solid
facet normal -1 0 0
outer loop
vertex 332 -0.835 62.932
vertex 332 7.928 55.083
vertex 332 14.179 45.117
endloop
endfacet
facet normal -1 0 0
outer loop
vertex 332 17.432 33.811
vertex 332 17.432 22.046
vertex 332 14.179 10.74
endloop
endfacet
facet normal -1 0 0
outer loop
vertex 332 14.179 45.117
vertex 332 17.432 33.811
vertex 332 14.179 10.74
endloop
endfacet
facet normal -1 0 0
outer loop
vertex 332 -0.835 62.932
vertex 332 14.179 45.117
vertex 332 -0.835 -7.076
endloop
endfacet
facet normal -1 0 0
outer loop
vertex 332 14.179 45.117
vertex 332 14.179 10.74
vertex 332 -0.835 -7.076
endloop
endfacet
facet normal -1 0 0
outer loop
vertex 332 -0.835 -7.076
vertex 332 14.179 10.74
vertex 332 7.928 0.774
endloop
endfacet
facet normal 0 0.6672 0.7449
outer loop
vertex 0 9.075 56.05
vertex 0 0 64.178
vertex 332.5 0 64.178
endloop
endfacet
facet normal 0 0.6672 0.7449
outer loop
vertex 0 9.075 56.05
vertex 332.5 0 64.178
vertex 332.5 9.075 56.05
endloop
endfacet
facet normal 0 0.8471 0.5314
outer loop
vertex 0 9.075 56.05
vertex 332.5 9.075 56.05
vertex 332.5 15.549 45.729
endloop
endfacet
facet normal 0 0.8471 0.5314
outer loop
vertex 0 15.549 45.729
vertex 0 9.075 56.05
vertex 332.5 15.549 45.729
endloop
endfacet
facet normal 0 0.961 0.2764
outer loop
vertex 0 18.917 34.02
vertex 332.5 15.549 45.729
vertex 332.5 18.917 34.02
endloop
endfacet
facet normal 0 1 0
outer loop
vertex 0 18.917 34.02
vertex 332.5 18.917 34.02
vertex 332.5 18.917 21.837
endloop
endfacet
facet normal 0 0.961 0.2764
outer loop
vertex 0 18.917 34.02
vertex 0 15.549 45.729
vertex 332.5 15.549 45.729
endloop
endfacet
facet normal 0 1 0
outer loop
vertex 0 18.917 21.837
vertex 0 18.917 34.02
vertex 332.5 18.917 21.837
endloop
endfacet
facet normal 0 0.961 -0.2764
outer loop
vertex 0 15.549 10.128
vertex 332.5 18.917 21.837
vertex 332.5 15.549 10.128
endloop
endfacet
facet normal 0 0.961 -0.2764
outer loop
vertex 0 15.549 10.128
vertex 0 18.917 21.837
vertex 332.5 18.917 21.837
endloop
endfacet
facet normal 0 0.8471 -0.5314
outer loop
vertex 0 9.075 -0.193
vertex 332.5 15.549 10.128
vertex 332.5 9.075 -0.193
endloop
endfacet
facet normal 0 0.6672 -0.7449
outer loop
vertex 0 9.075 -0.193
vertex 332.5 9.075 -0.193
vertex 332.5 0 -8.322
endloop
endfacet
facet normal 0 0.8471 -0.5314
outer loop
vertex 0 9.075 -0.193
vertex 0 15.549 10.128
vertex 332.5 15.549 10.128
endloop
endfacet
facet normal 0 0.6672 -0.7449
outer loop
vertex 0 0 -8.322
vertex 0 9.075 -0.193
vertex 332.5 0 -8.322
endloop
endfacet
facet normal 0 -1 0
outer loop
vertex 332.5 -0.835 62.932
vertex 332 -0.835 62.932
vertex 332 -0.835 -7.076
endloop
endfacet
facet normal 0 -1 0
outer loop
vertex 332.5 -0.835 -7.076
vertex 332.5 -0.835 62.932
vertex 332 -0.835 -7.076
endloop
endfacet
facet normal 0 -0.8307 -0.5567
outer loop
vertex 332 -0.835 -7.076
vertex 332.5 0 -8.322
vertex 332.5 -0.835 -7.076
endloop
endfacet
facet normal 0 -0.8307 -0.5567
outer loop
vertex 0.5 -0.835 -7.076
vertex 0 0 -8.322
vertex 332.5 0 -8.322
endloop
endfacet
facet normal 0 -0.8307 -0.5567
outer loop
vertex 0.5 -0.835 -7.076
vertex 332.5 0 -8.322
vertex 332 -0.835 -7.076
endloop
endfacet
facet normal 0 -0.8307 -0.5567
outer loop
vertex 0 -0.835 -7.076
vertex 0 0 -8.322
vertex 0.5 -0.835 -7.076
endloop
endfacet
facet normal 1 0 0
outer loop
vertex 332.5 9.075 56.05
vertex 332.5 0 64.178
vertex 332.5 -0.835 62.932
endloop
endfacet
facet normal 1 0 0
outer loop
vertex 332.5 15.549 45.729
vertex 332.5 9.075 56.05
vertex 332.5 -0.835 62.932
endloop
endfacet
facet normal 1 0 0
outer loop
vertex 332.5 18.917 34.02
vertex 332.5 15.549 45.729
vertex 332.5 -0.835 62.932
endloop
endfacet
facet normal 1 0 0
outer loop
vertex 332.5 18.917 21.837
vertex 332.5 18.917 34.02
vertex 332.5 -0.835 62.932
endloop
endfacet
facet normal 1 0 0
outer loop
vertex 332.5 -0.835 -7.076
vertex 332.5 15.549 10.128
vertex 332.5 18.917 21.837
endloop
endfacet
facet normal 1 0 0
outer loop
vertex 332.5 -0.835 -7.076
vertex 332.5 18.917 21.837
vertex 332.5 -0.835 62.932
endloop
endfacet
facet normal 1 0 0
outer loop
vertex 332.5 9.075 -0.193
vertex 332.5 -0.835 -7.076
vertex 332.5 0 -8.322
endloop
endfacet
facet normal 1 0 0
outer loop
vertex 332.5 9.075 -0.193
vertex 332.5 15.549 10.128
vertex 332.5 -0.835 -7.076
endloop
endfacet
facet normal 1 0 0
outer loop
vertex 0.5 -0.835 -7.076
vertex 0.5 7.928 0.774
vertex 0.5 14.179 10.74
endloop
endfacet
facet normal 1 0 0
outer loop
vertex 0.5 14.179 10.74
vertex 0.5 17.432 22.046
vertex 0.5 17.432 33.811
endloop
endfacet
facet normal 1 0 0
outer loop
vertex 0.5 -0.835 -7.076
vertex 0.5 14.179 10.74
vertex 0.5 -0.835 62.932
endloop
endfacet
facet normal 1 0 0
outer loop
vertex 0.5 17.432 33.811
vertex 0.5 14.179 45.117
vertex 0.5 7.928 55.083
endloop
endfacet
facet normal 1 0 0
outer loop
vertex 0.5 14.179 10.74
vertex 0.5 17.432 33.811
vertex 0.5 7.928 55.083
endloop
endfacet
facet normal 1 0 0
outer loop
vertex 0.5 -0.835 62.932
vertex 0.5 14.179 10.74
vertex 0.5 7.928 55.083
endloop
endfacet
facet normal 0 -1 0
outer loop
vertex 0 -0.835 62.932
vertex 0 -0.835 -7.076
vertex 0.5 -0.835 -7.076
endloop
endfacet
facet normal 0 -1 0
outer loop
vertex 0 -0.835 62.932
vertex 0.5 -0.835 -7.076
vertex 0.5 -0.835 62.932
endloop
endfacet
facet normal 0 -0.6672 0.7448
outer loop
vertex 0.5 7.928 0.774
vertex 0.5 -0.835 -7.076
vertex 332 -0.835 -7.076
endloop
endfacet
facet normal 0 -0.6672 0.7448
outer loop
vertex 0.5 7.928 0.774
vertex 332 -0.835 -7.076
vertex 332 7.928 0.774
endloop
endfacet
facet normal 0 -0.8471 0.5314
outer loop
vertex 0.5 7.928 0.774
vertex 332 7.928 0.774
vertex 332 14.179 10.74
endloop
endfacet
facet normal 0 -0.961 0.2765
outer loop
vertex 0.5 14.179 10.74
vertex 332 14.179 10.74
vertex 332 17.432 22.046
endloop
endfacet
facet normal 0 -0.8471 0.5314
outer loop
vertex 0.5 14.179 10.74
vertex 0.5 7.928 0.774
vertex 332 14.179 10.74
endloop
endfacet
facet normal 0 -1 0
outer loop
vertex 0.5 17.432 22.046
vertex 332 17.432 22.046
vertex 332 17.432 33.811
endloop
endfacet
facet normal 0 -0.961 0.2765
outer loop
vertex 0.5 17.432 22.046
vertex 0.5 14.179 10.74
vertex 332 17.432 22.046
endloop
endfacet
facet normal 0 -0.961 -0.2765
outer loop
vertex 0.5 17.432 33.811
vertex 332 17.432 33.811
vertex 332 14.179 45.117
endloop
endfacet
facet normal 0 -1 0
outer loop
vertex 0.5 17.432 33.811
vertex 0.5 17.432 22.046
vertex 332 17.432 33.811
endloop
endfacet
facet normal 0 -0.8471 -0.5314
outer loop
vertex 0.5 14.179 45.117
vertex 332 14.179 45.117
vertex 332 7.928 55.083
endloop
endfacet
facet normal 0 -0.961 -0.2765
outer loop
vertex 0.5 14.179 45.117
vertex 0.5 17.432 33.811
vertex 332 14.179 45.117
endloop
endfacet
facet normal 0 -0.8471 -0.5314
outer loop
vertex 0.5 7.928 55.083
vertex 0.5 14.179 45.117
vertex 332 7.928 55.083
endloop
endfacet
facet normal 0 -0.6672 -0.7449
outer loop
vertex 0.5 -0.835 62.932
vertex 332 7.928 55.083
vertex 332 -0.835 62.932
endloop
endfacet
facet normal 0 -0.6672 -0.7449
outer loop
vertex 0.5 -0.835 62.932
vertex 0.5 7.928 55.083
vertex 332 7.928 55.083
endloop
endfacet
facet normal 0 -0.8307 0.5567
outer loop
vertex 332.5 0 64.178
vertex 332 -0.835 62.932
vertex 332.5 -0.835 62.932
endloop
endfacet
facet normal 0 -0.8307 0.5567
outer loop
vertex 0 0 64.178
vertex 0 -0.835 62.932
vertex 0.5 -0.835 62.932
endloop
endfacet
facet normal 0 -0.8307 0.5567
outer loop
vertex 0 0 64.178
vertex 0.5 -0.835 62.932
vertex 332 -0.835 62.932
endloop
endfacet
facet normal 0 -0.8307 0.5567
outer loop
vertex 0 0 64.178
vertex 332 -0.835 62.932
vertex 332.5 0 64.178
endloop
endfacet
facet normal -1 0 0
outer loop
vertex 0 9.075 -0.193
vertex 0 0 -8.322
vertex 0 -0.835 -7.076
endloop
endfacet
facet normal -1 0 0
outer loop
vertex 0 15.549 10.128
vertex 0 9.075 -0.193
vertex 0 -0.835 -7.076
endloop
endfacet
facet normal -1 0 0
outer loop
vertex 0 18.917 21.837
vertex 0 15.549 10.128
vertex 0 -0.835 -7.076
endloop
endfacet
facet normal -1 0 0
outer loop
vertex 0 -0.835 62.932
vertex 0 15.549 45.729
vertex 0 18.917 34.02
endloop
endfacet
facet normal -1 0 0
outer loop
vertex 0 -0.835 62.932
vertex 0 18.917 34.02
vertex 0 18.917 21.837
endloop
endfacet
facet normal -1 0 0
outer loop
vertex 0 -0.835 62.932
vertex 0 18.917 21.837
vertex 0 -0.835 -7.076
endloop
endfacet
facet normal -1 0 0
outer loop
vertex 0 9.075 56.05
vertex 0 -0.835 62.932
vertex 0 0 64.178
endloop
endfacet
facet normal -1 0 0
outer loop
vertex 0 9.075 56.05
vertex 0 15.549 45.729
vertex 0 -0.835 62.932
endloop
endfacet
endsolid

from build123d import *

# Parameters (mm, degrees)
EXTRUIR_L_MINA1_DEPTH   = 332.5
SALIENTE_EXTRUIR1_DEPTH = 0.5
SALIENTE_EXTRUIR2_START = -0.5
SALIENTE_EXTRUIR2_DEPTH = 0.5


with BuildPart() as part:
    # Croquis2 → Extruir-Lámina1 (new body)
    with BuildSketch(Plane(origin=(0, 0, 0), x_dir=(0, 0, -1), z_dir=(1, 0, 0))):
        with BuildLine():
            ThreePointArc((-64.178417971, 0), (-27.928417971, 19.344325839), (8.321582029, 0))
            Line((8.321582029, 0), (7.075512909, -0.835051942))
            ThreePointArc((7.075512909, -0.835051942), (-27.928417971, 17.844325839), (-62.93234885, -0.835051942))
            Line((-62.93234885, -0.835051942), (-64.178417971, 0))
        make_face()
    extrude(amount=EXTRUIR_L_MINA1_DEPTH)

    # Croquis3 → Saliente-Extruir1 (add)
    with BuildSketch(Plane.ZY):
        with BuildLine():
            Line((-7.075512909, -0.835051942), (62.93234885, -0.835051942))
            ThreePointArc((62.93234885, -0.835051942), (27.928417971, 17.844325839), (-7.075512909, -0.835051942))
        make_face()
    extrude(amount=-SALIENTE_EXTRUIR1_DEPTH)

    # Croquis4 → Saliente-Extruir2 (add)
    with BuildSketch(Plane(origin=(332.5, 0, 0), x_dir=(0, 0, -1), z_dir=(1, 0, 0)).offset(SALIENTE_EXTRUIR2_START)):
        with BuildLine():
            Line((-62.93234885, -0.835051942), (7.075512909, -0.835051942))
            ThreePointArc((7.075512909, -0.835051942), (-27.928417971, 17.844325839), (-62.93234885, -0.835051942))
        make_face()
    extrude(amount=SALIENTE_EXTRUIR2_DEPTH)


solid = part.part
